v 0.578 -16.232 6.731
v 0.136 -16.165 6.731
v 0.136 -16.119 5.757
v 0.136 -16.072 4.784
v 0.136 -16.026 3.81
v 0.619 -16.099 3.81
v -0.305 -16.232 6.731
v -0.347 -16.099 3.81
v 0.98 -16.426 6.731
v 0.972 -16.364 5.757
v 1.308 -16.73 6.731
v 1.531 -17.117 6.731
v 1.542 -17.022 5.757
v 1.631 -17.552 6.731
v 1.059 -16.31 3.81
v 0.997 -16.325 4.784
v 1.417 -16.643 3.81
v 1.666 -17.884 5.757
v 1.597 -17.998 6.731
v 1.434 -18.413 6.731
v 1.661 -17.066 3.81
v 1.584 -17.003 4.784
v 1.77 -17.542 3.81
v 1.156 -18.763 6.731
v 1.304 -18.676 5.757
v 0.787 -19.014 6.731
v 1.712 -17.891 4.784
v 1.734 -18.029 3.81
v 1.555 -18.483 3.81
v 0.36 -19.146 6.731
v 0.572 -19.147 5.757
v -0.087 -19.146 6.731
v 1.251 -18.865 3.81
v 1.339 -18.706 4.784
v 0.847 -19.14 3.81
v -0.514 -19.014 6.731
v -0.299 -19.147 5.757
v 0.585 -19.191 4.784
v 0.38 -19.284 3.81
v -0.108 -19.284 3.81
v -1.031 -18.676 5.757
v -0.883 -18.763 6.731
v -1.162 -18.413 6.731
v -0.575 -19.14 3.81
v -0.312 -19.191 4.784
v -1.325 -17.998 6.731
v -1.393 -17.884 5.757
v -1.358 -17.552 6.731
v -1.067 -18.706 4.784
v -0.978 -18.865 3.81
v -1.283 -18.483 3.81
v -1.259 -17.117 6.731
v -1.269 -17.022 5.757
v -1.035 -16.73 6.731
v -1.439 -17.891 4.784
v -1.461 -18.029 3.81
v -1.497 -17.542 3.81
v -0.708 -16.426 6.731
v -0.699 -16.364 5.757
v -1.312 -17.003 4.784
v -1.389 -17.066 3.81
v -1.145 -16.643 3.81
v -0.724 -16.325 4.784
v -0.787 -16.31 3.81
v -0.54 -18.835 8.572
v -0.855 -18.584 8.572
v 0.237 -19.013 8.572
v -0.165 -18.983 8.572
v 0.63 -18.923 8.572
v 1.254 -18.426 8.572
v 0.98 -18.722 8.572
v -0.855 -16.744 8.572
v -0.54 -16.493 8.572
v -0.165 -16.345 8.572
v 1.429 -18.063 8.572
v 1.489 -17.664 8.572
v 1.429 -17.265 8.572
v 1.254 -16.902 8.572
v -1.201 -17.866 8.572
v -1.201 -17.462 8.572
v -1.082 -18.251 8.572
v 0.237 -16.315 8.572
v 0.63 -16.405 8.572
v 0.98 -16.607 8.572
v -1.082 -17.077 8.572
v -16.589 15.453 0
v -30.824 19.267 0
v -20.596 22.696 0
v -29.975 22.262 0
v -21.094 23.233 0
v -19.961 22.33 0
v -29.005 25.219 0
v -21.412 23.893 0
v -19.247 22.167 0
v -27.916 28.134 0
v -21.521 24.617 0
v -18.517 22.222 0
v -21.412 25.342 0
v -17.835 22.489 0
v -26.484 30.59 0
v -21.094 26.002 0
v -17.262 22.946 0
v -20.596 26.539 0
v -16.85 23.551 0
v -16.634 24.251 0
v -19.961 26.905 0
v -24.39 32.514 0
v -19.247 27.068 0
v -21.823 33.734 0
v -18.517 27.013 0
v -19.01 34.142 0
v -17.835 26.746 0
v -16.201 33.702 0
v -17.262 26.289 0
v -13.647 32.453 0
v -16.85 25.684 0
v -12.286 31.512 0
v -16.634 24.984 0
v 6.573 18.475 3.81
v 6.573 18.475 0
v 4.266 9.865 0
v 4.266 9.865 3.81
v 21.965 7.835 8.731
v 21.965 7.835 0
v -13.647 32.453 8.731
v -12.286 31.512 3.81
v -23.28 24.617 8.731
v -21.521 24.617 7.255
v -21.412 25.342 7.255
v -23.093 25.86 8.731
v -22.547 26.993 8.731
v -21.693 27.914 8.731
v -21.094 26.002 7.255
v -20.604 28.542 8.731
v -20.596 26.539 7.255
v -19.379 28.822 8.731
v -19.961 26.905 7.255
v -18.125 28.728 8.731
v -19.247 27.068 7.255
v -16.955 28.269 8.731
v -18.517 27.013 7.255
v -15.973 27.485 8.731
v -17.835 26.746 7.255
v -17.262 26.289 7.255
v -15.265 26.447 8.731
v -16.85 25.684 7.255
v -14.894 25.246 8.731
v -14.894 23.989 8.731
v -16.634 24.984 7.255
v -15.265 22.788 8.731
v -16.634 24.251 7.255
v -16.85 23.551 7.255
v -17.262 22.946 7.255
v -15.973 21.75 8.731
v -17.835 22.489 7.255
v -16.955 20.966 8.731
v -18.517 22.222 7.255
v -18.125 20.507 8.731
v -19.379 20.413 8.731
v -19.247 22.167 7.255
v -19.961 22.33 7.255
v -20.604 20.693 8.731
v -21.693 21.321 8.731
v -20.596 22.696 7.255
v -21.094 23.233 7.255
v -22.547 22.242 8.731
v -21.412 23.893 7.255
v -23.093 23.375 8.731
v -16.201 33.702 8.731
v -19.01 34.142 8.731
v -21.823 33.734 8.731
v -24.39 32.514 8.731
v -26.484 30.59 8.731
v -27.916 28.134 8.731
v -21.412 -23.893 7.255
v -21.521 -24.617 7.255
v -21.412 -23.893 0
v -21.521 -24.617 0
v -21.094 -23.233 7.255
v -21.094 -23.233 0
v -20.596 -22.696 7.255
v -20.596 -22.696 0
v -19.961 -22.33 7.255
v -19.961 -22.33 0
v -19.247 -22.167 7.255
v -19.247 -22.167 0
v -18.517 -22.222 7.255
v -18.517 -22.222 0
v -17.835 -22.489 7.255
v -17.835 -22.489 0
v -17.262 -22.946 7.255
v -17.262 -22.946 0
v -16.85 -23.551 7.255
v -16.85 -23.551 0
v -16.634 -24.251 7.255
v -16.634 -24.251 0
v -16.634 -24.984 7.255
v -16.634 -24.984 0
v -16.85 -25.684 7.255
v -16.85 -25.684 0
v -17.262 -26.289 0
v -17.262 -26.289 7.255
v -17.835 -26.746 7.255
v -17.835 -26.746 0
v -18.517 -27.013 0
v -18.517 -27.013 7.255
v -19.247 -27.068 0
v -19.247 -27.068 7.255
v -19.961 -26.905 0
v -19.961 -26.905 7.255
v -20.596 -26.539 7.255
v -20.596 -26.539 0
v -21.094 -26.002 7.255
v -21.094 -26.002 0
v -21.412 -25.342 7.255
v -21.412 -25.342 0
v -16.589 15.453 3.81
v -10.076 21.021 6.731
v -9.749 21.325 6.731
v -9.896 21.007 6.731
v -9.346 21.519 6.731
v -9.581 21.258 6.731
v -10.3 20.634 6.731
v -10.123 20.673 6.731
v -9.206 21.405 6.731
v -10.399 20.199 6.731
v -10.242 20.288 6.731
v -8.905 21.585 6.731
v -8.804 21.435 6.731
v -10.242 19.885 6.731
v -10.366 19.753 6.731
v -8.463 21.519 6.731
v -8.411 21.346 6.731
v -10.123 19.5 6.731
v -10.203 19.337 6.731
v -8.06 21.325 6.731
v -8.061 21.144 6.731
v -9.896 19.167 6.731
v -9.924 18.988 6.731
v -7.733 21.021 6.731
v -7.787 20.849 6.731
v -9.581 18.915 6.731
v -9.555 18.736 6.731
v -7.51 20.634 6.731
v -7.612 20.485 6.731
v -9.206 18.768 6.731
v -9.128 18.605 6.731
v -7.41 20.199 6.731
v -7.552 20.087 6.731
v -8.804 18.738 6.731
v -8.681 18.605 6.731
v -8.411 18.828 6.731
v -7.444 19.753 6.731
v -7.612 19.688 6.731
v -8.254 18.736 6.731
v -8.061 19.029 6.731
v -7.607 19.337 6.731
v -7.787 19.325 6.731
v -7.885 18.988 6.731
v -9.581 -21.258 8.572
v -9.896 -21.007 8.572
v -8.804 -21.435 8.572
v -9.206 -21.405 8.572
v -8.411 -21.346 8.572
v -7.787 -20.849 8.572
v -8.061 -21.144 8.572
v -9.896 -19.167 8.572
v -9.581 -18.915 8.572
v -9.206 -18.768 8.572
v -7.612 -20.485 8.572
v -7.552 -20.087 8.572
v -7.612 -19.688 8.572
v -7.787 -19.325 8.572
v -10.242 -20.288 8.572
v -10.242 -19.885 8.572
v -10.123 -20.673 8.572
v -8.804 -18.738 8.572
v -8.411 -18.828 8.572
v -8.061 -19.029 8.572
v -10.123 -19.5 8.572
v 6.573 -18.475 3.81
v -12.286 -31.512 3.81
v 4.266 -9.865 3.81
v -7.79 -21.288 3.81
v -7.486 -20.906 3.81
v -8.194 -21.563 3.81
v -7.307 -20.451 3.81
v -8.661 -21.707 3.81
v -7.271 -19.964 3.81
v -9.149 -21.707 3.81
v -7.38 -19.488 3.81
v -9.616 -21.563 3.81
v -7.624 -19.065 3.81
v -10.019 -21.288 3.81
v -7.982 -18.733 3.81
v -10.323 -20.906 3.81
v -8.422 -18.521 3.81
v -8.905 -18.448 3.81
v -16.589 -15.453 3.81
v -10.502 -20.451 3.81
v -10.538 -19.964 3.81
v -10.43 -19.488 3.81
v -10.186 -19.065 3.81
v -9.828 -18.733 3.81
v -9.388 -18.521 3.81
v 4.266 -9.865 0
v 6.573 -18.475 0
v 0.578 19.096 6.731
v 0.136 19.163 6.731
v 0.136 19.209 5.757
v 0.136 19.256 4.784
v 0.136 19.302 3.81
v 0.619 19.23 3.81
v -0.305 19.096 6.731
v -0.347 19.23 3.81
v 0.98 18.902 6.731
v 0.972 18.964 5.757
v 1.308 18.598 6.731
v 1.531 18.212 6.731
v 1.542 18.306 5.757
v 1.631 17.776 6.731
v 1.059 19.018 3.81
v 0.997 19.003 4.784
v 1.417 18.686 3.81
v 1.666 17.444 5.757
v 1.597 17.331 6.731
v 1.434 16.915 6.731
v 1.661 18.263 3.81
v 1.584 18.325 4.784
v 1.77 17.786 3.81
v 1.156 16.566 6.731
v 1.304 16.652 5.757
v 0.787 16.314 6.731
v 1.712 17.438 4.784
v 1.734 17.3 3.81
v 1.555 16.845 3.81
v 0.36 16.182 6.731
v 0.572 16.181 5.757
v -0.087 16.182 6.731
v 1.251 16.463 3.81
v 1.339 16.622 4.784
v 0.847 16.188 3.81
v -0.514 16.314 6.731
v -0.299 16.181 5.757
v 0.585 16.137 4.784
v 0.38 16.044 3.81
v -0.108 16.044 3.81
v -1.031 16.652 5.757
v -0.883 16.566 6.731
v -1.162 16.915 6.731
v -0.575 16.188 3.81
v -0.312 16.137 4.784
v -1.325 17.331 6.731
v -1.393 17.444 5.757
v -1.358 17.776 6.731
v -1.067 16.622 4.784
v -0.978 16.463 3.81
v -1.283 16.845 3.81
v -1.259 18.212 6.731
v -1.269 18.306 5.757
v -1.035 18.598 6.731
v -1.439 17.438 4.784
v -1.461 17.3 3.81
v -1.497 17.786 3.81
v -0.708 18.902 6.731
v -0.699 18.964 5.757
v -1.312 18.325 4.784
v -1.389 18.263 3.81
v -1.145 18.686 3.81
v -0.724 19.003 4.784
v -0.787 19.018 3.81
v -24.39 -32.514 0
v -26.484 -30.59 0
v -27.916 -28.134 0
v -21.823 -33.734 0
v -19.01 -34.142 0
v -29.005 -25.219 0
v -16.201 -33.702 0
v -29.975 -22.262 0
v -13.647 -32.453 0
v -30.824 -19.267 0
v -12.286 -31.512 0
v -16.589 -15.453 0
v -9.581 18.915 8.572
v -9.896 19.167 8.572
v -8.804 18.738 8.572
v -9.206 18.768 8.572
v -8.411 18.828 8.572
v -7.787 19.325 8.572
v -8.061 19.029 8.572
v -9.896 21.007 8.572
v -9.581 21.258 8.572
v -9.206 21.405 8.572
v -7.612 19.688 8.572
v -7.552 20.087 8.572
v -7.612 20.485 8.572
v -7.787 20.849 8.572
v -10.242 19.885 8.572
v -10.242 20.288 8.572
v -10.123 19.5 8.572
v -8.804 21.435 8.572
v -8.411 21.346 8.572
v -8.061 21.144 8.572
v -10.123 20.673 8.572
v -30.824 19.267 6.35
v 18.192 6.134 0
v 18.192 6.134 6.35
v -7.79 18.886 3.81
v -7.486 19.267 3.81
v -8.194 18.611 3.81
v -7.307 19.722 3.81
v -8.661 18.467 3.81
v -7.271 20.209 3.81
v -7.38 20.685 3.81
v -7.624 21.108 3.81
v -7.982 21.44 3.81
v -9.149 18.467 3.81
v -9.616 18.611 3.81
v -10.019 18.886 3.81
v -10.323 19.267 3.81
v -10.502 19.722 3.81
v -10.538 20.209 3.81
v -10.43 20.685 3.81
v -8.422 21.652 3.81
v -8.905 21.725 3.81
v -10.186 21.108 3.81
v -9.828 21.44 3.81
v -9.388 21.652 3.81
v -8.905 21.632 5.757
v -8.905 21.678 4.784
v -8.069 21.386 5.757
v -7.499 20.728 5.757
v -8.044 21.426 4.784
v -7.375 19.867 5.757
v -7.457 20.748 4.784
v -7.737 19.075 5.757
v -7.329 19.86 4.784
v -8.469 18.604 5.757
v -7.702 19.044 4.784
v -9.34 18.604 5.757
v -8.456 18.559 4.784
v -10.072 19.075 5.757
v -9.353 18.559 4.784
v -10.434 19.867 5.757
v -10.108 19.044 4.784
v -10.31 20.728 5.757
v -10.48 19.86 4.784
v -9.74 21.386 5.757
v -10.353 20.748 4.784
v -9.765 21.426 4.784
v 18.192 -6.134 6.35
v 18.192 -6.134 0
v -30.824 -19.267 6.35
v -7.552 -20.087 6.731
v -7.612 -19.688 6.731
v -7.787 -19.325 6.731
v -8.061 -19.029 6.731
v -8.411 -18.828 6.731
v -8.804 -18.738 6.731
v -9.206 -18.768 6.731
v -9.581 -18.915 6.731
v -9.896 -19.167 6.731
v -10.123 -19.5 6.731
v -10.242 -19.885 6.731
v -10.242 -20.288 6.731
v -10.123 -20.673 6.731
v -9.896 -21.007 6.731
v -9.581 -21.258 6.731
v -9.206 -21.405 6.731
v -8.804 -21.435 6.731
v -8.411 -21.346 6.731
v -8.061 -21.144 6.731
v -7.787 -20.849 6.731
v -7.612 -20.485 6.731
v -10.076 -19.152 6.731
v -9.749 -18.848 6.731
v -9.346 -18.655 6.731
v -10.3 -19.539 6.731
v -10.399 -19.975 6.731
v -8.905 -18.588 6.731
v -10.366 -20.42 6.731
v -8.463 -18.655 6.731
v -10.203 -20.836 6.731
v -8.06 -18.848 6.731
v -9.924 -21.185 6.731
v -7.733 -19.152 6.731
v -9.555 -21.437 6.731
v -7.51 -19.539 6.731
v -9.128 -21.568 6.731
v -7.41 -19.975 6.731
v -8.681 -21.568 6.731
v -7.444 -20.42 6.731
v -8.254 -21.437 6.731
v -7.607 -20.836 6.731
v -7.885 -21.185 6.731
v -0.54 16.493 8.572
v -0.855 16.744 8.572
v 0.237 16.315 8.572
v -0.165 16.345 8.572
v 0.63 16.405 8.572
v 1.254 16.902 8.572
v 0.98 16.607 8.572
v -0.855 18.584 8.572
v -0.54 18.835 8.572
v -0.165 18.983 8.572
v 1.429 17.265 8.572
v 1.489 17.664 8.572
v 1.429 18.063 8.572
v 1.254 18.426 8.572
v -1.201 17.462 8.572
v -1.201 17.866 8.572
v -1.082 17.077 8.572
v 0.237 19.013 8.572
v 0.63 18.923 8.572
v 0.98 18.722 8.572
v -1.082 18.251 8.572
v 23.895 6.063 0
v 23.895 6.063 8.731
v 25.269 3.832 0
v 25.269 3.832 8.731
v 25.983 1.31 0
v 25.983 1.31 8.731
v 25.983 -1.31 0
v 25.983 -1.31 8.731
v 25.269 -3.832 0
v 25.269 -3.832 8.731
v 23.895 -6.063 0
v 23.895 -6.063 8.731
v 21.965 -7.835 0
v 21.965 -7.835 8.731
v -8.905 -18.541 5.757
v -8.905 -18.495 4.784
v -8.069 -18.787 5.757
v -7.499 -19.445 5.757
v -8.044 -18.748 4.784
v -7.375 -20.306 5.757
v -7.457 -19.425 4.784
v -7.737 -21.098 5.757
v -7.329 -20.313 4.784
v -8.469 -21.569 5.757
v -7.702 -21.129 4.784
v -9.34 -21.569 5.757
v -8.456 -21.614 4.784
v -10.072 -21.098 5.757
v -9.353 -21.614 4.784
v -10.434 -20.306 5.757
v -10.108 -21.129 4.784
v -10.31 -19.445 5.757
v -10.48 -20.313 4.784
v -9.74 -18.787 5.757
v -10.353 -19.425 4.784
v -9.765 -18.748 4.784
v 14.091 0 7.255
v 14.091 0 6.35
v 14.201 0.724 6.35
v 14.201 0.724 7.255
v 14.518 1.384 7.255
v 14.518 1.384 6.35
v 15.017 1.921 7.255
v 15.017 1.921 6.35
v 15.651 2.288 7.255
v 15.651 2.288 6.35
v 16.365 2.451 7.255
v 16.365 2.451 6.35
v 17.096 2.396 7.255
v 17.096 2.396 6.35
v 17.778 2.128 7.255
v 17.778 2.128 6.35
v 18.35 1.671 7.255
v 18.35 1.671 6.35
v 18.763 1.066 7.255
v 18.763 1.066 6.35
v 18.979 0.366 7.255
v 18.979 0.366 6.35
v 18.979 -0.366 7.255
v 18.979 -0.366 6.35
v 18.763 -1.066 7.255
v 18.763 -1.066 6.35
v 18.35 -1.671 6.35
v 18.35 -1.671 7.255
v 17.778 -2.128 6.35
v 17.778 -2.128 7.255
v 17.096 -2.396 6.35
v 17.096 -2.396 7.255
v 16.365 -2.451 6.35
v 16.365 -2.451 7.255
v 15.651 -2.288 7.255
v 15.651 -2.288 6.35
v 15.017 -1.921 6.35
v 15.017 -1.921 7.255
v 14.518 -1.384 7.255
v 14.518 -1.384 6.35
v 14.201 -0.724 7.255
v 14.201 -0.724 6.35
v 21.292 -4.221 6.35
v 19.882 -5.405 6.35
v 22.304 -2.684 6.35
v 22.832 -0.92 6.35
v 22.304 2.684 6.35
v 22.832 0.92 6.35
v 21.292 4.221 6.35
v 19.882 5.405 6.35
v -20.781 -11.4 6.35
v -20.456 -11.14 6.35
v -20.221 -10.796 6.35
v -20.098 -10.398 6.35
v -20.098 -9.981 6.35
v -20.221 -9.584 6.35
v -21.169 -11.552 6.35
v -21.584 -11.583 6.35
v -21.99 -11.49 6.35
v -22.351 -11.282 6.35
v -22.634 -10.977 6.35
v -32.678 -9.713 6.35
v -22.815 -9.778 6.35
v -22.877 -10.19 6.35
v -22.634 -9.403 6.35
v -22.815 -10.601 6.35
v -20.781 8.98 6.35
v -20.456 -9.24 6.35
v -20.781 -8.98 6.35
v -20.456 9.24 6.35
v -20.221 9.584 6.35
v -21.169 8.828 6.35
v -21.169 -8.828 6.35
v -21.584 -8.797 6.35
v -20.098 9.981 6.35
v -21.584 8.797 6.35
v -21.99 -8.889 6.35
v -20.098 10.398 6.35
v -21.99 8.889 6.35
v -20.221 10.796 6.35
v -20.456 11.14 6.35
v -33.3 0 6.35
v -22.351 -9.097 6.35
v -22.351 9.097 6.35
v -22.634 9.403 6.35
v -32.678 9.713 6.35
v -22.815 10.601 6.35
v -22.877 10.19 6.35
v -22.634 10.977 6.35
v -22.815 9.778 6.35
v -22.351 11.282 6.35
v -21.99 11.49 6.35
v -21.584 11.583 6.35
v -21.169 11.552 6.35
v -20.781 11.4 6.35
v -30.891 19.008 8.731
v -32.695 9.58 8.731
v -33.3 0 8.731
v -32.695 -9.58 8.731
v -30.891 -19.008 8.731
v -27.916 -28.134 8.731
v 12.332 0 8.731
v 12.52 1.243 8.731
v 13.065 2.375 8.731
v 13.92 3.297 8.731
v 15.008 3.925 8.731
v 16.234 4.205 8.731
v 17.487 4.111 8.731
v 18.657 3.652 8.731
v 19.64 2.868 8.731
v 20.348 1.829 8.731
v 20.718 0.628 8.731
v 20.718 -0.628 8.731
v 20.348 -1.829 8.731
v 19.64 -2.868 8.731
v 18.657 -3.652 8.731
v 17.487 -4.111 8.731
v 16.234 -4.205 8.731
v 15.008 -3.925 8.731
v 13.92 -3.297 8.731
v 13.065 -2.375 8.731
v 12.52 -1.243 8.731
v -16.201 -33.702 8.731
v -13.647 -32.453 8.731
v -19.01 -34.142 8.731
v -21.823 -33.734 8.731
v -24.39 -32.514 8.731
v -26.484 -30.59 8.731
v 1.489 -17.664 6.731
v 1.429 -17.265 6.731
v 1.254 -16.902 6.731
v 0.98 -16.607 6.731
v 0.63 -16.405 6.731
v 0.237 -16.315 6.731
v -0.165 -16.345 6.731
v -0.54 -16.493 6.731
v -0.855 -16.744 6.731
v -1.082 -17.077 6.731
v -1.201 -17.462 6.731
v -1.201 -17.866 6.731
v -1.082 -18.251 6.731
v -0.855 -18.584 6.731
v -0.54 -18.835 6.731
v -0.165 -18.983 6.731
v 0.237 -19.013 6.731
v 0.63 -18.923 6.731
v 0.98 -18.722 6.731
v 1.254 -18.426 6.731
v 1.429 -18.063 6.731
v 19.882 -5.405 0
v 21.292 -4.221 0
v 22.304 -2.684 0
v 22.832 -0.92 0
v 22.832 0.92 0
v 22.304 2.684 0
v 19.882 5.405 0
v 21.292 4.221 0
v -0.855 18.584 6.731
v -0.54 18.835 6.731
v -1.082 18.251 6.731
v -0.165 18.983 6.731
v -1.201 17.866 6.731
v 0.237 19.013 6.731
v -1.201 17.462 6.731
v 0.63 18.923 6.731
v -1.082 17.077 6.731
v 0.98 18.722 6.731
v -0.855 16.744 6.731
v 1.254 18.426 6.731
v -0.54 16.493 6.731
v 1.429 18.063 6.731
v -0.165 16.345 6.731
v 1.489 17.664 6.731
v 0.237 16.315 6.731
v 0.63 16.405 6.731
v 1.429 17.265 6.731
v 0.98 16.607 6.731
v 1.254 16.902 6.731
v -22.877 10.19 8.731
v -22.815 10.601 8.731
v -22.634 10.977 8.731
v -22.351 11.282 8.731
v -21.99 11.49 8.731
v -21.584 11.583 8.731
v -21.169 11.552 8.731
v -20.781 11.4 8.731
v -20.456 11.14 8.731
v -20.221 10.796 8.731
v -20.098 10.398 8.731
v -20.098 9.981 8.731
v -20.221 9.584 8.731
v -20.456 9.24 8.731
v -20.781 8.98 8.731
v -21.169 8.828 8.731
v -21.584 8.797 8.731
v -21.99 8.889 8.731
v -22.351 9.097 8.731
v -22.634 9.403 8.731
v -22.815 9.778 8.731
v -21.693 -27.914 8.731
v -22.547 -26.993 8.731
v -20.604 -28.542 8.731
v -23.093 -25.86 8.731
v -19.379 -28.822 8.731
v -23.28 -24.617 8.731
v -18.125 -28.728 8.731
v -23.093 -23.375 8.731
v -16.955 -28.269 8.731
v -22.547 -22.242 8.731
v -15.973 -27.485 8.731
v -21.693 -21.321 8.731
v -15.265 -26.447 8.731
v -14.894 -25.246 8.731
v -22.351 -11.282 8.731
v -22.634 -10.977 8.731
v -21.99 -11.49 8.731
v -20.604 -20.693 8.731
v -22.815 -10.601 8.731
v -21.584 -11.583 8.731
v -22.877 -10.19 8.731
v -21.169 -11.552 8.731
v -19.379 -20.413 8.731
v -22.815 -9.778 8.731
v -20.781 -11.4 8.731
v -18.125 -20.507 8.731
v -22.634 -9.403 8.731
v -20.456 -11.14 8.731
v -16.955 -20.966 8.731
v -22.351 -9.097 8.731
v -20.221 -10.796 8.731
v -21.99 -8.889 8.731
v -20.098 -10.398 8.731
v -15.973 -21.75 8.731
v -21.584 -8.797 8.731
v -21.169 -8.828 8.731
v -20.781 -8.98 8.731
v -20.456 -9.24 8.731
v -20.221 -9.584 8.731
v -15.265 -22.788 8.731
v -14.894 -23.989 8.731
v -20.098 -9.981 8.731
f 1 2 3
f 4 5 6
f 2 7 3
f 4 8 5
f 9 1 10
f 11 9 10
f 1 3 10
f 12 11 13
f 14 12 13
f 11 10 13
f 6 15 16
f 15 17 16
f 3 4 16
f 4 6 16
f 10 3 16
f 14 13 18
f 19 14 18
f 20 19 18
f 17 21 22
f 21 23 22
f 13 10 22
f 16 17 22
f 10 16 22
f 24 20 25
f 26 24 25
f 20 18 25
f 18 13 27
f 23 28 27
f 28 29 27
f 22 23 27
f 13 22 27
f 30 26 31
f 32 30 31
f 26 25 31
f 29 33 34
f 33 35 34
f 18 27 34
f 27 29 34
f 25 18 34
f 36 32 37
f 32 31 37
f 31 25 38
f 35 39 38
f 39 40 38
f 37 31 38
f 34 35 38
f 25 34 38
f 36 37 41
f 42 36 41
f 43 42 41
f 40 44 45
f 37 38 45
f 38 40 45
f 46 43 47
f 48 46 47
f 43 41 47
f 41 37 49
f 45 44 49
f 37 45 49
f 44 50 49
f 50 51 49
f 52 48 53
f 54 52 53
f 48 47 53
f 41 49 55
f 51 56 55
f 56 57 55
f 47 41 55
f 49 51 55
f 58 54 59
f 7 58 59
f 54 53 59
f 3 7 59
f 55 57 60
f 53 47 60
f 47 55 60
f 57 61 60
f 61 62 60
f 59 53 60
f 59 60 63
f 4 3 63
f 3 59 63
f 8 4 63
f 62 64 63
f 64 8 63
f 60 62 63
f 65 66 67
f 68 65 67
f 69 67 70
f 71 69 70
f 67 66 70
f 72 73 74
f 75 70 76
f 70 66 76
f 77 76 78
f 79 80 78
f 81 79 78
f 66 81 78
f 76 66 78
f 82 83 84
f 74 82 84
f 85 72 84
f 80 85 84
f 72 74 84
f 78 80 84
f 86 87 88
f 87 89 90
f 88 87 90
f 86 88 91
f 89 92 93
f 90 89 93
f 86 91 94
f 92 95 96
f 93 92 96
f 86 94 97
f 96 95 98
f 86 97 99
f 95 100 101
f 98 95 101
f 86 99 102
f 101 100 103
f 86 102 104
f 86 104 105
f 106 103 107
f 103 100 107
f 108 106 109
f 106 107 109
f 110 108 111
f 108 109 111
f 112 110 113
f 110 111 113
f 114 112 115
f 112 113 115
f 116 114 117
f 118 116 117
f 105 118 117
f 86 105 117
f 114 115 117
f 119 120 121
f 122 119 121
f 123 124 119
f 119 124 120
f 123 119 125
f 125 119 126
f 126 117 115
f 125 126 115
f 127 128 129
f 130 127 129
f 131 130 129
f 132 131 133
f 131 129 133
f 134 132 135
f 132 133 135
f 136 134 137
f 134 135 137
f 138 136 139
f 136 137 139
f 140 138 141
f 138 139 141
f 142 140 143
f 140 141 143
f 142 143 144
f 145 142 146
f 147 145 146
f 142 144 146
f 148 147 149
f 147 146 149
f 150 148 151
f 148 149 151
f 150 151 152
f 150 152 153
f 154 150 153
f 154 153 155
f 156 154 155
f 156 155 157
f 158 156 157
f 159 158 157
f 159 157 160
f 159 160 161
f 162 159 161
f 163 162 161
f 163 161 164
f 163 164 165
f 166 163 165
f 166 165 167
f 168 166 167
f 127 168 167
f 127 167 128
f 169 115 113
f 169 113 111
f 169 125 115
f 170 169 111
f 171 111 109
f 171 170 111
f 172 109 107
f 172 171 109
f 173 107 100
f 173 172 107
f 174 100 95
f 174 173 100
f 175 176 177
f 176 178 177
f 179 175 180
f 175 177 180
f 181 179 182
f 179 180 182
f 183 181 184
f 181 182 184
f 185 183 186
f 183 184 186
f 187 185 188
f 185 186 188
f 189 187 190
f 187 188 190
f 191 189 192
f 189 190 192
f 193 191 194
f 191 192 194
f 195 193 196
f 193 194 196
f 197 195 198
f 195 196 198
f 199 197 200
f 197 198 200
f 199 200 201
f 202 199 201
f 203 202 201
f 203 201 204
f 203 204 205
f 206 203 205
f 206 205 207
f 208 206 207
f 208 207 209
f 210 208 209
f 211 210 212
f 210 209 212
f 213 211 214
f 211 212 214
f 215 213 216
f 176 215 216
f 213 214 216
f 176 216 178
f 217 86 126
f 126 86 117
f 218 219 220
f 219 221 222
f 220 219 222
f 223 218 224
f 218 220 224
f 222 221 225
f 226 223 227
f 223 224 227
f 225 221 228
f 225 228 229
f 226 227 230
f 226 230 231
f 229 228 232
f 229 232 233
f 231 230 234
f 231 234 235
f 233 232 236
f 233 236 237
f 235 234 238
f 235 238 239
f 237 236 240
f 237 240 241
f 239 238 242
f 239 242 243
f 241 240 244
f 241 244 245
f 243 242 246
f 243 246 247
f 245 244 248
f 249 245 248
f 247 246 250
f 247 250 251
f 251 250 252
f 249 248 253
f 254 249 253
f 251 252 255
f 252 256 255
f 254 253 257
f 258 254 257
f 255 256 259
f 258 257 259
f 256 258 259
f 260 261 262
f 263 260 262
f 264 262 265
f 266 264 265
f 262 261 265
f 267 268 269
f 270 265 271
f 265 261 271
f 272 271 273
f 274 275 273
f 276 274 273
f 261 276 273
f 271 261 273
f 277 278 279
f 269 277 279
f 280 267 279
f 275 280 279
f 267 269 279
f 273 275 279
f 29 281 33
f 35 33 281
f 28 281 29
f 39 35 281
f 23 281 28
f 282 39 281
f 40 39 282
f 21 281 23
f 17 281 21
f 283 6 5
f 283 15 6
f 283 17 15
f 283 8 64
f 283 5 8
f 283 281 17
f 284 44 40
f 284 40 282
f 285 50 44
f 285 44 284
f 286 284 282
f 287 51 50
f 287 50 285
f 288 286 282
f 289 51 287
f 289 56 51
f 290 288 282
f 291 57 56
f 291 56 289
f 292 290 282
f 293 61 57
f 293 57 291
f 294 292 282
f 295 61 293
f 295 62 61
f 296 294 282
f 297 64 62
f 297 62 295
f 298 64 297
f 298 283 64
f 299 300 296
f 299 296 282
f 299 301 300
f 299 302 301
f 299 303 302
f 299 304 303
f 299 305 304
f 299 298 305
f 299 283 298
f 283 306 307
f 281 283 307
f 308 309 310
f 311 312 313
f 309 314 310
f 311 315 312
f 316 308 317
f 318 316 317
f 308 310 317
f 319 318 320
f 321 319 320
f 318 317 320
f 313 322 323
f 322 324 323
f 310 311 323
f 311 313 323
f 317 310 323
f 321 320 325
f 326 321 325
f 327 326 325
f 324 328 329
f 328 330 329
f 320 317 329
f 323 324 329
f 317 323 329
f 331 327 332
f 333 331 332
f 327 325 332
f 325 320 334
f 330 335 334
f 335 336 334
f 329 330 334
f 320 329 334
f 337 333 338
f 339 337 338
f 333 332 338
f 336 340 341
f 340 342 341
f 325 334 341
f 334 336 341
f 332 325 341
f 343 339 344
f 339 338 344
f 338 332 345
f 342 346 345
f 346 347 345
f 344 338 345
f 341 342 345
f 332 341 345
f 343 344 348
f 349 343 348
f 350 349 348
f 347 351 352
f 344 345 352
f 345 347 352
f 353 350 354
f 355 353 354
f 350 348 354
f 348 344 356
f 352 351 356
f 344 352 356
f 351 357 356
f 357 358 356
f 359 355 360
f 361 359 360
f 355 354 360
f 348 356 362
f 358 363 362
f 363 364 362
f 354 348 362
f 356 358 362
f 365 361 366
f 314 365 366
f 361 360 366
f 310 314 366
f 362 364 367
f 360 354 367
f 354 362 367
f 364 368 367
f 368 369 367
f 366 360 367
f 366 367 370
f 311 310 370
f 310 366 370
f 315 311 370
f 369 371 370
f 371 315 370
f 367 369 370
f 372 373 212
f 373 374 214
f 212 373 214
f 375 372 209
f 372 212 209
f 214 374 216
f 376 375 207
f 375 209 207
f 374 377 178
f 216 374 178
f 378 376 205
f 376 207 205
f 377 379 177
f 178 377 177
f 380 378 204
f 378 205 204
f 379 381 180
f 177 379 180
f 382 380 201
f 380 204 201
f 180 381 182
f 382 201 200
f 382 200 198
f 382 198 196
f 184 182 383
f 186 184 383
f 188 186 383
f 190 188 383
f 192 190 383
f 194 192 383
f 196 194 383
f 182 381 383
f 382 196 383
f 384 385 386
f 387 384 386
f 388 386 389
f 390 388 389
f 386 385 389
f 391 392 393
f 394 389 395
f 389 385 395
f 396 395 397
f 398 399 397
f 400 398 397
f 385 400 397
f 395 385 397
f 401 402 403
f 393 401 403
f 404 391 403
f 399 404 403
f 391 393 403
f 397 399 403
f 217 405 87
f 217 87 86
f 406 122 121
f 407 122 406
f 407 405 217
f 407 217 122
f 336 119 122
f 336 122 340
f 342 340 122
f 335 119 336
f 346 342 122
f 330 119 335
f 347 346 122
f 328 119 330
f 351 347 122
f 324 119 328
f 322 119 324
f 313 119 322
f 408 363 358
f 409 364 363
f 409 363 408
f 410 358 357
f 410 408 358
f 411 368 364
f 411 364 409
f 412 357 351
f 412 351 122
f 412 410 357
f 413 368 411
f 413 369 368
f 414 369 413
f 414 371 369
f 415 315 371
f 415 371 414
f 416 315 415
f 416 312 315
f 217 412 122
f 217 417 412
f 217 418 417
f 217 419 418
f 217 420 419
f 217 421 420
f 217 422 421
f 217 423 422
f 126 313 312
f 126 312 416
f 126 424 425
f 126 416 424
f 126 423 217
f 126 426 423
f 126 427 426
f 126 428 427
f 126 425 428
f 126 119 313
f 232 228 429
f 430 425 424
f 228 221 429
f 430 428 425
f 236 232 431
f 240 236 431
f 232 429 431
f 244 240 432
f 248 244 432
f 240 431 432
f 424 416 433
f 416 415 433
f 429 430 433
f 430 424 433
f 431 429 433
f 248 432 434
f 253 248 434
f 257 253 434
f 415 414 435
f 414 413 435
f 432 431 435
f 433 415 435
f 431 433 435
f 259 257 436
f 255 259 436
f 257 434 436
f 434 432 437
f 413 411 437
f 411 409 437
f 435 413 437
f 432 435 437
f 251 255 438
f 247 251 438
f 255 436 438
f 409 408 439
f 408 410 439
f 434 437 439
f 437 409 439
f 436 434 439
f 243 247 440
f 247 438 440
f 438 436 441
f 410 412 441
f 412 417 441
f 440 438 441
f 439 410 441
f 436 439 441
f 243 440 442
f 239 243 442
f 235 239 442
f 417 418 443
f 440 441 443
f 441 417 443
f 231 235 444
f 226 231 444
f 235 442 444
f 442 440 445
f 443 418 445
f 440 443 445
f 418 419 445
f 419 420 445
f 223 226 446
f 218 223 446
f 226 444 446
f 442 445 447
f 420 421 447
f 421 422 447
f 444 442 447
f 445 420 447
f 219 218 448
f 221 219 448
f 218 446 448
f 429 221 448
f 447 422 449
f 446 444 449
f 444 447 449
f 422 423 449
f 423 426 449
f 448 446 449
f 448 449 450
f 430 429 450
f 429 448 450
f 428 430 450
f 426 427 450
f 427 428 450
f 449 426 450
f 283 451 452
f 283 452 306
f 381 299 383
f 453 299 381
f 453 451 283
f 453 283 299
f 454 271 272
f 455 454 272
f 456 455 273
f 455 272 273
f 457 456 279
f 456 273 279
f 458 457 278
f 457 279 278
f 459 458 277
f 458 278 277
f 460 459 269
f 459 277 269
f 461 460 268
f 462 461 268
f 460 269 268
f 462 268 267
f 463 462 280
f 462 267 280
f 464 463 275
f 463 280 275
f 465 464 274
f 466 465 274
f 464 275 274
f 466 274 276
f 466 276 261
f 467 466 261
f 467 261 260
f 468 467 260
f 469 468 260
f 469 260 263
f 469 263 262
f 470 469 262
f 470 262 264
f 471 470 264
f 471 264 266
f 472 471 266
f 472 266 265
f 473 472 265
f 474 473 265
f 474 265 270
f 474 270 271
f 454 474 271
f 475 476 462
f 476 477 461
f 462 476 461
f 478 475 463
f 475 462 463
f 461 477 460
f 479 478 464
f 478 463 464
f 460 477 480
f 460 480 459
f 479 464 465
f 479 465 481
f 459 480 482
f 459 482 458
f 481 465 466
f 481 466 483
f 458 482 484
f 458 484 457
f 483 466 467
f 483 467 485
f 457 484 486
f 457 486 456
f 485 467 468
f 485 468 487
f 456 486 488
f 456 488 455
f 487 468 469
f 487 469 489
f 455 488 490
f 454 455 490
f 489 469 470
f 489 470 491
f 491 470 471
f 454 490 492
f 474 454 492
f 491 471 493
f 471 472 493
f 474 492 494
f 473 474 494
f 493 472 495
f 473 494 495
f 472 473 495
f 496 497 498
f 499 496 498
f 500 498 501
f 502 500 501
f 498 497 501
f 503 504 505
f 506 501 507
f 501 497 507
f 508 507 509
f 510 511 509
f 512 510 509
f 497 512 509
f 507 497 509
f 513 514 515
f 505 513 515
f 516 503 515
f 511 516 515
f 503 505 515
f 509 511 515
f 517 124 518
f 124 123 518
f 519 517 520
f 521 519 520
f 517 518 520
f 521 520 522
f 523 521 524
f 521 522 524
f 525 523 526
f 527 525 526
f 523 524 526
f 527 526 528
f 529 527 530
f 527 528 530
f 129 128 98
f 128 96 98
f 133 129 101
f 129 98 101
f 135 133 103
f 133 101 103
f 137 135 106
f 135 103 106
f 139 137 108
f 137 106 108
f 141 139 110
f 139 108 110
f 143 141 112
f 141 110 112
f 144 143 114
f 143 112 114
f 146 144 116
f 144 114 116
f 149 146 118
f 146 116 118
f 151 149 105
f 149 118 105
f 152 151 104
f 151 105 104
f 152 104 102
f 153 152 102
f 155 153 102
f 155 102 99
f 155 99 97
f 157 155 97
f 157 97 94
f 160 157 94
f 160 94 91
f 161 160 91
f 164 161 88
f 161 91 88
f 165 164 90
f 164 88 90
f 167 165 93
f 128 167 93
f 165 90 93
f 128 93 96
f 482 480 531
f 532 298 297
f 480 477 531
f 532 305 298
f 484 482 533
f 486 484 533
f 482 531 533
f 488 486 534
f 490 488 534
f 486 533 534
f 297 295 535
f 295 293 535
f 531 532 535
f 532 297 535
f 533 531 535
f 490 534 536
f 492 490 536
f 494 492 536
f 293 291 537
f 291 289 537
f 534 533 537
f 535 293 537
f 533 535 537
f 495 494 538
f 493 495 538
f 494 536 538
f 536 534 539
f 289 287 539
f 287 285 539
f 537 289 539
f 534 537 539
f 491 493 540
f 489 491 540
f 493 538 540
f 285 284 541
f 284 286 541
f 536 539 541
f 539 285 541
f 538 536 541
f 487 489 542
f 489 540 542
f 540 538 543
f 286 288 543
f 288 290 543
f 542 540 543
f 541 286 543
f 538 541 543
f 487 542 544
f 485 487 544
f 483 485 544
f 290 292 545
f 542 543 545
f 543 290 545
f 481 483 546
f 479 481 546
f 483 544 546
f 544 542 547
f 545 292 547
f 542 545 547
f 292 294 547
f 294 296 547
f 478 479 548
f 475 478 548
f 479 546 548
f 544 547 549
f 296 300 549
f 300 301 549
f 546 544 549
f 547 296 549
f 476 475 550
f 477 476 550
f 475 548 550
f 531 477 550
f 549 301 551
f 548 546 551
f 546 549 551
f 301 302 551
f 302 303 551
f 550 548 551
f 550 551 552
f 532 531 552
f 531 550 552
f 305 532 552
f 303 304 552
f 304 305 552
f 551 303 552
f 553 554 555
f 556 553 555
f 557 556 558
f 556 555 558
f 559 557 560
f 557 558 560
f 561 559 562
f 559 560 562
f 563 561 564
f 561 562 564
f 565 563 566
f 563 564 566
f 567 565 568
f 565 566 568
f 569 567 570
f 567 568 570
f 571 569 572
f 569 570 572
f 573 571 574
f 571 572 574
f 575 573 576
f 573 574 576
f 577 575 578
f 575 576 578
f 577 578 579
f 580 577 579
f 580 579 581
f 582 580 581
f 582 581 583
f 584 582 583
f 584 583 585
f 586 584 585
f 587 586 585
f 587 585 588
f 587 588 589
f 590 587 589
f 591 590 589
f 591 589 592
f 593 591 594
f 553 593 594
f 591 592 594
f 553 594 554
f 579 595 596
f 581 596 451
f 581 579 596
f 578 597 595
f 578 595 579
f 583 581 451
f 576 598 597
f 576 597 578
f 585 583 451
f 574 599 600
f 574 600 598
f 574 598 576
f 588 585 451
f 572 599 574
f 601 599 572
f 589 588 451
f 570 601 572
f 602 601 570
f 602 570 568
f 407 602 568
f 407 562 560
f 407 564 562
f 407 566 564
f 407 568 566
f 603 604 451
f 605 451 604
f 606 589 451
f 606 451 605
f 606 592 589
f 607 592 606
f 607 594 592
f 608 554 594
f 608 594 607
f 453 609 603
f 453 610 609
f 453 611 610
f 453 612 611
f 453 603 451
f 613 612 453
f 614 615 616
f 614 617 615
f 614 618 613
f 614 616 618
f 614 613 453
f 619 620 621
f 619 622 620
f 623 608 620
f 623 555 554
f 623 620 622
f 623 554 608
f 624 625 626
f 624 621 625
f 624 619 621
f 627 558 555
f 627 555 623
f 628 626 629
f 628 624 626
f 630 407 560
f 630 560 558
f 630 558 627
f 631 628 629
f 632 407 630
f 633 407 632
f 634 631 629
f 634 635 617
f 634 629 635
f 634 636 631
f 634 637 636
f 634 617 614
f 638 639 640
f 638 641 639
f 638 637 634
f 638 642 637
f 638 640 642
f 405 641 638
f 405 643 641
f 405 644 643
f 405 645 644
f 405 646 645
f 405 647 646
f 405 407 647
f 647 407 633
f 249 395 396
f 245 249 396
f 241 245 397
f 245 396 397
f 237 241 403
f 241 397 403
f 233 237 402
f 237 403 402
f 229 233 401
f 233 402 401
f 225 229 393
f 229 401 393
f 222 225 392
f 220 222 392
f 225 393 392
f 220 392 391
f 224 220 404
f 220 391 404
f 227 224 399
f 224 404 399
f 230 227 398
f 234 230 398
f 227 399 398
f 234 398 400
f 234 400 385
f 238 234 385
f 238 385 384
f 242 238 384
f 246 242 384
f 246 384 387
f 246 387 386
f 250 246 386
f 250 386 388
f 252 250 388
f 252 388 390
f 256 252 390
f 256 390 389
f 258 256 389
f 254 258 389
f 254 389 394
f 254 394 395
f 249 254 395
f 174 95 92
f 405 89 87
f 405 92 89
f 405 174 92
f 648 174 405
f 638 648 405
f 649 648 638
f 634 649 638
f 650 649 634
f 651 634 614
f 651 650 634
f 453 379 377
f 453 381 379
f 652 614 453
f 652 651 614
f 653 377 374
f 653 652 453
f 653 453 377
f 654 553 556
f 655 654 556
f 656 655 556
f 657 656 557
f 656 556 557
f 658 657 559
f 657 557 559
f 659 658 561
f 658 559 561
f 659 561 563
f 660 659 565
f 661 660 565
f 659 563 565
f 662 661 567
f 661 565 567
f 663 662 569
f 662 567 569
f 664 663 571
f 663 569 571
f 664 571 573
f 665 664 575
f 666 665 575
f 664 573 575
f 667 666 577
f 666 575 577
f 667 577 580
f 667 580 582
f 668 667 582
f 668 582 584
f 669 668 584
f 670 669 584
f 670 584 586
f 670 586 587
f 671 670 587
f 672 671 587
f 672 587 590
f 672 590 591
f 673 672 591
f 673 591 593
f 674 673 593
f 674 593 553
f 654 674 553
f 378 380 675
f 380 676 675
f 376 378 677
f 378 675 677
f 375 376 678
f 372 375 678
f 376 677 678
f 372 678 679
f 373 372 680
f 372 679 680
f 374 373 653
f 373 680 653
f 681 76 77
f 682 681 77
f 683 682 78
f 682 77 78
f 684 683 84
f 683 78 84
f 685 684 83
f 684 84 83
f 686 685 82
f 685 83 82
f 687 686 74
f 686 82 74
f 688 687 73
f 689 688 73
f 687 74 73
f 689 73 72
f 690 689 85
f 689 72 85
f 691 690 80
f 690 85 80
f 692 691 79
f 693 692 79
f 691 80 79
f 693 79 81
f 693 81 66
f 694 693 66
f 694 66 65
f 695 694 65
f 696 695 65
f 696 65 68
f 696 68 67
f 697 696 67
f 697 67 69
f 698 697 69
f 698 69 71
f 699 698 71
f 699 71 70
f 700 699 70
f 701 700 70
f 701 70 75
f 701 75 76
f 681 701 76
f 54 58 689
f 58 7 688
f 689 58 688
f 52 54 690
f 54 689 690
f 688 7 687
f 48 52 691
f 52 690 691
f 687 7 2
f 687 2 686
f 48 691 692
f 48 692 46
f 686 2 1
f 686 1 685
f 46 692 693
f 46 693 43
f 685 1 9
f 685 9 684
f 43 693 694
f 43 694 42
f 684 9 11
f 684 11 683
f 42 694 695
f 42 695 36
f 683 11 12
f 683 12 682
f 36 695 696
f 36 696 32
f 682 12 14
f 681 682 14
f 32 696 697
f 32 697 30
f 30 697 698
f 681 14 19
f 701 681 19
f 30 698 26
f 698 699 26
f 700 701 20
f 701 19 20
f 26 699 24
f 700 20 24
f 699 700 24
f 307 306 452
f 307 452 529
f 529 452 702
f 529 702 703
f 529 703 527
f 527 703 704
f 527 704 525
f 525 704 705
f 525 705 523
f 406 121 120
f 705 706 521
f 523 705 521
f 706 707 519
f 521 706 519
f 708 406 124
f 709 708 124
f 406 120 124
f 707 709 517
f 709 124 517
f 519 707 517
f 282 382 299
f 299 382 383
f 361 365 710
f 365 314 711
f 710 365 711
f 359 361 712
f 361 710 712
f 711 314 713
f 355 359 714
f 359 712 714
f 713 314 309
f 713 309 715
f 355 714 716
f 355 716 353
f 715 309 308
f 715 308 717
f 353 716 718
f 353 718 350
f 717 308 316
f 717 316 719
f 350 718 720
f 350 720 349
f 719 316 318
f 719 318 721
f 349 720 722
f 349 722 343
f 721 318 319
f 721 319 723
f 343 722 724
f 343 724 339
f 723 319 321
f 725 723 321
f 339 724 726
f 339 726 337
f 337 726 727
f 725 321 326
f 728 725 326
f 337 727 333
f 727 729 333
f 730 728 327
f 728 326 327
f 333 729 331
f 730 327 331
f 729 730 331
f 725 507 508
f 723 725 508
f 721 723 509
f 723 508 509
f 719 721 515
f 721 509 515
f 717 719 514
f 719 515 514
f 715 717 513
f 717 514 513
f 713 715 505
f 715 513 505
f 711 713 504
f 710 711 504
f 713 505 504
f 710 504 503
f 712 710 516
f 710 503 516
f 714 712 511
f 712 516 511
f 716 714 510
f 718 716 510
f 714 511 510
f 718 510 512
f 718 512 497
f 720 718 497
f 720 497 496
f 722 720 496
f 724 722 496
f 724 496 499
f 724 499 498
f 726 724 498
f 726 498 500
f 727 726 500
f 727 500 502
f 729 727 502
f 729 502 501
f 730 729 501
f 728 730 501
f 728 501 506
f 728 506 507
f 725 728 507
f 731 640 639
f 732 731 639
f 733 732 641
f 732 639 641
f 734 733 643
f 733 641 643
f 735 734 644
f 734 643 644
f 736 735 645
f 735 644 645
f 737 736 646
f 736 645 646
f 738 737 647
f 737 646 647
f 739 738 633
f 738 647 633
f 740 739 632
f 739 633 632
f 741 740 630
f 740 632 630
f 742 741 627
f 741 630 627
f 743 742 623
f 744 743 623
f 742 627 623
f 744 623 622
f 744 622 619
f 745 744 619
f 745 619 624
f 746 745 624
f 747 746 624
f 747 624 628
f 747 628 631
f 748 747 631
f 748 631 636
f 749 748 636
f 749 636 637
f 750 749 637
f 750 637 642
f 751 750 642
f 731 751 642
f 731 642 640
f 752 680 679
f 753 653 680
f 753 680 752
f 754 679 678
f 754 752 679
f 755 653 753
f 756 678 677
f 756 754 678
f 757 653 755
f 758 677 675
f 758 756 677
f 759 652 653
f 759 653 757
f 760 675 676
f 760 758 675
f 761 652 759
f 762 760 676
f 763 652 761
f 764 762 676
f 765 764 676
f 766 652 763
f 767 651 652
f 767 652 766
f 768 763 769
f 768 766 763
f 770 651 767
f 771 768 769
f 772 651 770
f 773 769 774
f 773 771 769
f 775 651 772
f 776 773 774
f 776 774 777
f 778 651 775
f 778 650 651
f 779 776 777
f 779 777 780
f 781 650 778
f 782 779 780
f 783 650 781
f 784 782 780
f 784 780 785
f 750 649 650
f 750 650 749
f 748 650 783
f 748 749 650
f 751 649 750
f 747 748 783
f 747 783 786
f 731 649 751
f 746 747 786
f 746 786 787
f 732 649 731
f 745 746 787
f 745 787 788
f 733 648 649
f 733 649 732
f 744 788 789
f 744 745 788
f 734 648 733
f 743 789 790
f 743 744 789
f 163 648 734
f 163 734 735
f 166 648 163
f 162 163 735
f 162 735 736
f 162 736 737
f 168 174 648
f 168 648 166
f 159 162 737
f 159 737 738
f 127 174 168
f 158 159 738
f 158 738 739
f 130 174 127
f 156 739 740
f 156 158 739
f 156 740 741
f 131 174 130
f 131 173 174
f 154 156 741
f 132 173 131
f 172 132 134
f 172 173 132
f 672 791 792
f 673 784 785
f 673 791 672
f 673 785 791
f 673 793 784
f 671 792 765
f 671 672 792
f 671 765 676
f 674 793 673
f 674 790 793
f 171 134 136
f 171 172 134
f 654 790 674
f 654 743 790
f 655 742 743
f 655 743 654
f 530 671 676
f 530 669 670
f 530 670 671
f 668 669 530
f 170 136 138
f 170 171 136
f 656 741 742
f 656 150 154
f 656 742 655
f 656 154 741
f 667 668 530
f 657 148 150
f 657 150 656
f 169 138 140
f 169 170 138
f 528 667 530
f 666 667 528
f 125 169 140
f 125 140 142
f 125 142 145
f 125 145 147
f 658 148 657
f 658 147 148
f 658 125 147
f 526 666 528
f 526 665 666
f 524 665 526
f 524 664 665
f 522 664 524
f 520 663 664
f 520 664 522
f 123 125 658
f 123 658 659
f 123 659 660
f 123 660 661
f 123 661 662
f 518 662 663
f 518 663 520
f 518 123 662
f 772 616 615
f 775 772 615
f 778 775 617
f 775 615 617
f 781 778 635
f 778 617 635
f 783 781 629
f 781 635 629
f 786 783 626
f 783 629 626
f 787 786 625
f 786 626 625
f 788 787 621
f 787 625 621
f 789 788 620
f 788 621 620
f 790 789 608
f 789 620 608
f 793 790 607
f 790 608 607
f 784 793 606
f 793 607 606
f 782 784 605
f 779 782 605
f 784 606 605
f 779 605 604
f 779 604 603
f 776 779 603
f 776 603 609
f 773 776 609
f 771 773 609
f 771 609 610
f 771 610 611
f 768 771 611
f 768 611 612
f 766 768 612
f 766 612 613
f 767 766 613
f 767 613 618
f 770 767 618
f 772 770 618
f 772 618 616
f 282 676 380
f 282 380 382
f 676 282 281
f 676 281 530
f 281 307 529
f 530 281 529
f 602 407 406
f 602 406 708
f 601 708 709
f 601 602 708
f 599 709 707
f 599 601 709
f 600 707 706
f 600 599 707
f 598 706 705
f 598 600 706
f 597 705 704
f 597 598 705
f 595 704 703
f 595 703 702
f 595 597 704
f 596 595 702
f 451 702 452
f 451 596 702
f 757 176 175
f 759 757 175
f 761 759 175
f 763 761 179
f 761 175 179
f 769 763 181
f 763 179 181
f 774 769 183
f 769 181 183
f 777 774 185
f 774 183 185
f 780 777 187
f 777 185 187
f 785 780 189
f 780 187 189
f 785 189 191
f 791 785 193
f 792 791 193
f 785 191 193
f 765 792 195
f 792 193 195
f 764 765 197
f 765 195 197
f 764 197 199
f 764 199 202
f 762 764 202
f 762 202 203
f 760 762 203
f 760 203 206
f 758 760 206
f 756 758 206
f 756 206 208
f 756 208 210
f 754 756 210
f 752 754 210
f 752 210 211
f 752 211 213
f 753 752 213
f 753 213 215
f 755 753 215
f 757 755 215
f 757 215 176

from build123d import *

# Parameters (mm, degrees)
BOSS_EXTRUDE1_DEPTH                               = 8.73125
SKETCH2_R                                         = 101.6
SKETCH2_R_2                                       = 76.2
CUT_EXTRUDE1_DEPTH                                = 58.485257961
FILLET1_R                                         = 9.525
CSK_FOR_8_FLAT_HEAD_MACHINE_SCREW_100_D           = 4.9149
CSK_FOR_8_FLAT_HEAD_MACHINE_SCREW_100_CSINK_D     = 8.4328
CSK_FOR_8_FLAT_HEAD_MACHINE_SCREW_100_CSINK_ANGLE = 100
CUT_EXTRUDE2_START                                = -6.35
CUT_EXTRUDE2_DEPTH                                = 6.35
CUT_EXTRUDE3_DEPTH                                = 3.81
SKETCH7_R                                         = 1.397
CUT_EXTRUDE4_DEPTH                                = 3.175
HOLE1_AT_2_COUNT                                  = 2
HOLE1_AT_2_PITCH                                  = 9.3599
HOLE1_AT_3_COUNT                                  = 2
HOLE1_AT_3_PITCH                                  = 38.818175673
HOLE1_AT_4_COUNT                                  = 2
HOLE1_AT_4_PITCH                                  = 40.17317123
F_2_CLEARANCE_HOLE1_D                             = 2.7051
F_2_CLEARANCE_HOLE1_DEPTH                         = 4.7625


with BuildPart() as part:
    # Sketch1 → Boss-Extrude1 (new body)
    with BuildSketch(Plane.XY):
        Polygon((33.299680929, 0), (-33.299680929, 46.0375), (-33.299680929, -46.0375), align=None)
    extrude(amount=BOSS_EXTRUDE1_DEPTH)

    # Sketch2 → Cut-Extrude1 (cut, through all)
    with BuildSketch(Plane.XY.offset(8.73125)):
        with Locations((42.900319071, 0)):
            Circle(SKETCH2_R)
        with Locations((42.900319071, 0)):
            Circle(SKETCH2_R_2, mode=Mode.SUBTRACT)
    extrude(amount=-CUT_EXTRUDE1_DEPTH, mode=Mode.SUBTRACT)

    # Fillet1
    fillet1_edges = [part.edges().sort_by_distance(p)[0] for p in [
        (-22.72460624, -38.727369881, 4.365625),
        (-22.72460624, 38.727369881, 4.365625),
        (33.299680929, 0, 4.365625),
    ]]
    fillet(fillet1_edges, radius=FILLET1_R)

    # CSK for #8 Flat Head Machine Screw (100)1 (through all)
    with Locations(Plane.XY.offset(8.73125)):
        with Locations((-19.063658953, -24.617494846), (-19.063658953, 24.617494846), (16.54881886, 0)):
            CounterSinkHole(CSK_FOR_8_FLAT_HEAD_MACHINE_SCREW_100_D / 2, CSK_FOR_8_FLAT_HEAD_MACHINE_SCREW_100_CSINK_D / 2, counter_sink_angle=CSK_FOR_8_FLAT_HEAD_MACHINE_SCREW_100_CSINK_ANGLE)

    # Sketch5 → Cut-Extrude2 (cut)
    with BuildSketch(Plane(origin=(0, 0, 0), x_dir=(-1, 0, 0), z_dir=(0, 0, -1)).offset(CUT_EXTRUDE2_START)):
        with BuildLine():
            Line((30.823542048, 19.267389595), (-18.192319797, 6.133628997))
            ThreePointArc((-18.192319797, 6.133628997), (-22.89881886, 0), (-18.192319797, -6.133628997))
            Line((-18.192319797, -6.133628997), (30.823542048, -19.267389595))
            ThreePointArc((30.823542048, -19.267389595), (33.299680929, 0), (30.823542048, 19.267389595))
        make_face()
    extrude(amount=CUT_EXTRUDE2_DEPTH, mode=Mode.SUBTRACT)

    # Sketch6 → Cut-Extrude3 (cut)
    with BuildSketch(Plane(origin=(0, 0, 0), x_dir=(-1, 0, 0), z_dir=(0, 0, -1))):
        Polygon((16.588726313, -15.453182214), (-4.265612277, -9.86527903), (-8.867414899, -27.039440222), (11.986923691, -32.627343405), align=None)
        Polygon((11.986923691, 32.627343405), (-8.867414899, 27.039440222), (-4.265612277, 9.86527903), (16.588726313, 15.453182214), align=None)
    extrude(amount=-CUT_EXTRUDE3_DEPTH, mode=Mode.SUBTRACT)

    # Sketch7 → Cut-Extrude4 (cut)
    with BuildSketch(Plane(origin=(0, 0, 6.35), x_dir=(-1, 0, 0), z_dir=(0, 0, -1))):
        with Locations((21.479680921, -10.189705806)):
            Circle(SKETCH7_R)
        with Locations((21.479680921, 10.189705806)):
            Circle(SKETCH7_R)
    extrude(amount=-CUT_EXTRUDE4_DEPTH, mode=Mode.SUBTRACT)

    # Sketch9 → Hole1 (revolve, cut)
    with BuildSketch(Plane(origin=(-8.904685942, -20.086585615, 3.81), x_dir=(0, 1, 0), z_dir=(1, 0, 0))):
        Polygon((0, 0), (0, 2.921), (1.4986, 2.921), (1.6383, 0), align=None)
    hole1 = revolve(axis=Axis((-8.904685942, -20.086585615, 113.81), (0, 0, -1)), mode=Mode.SUBTRACT)

    # Hole1 at 2: Hole1 ×2
    with Locations(*[Vector(0.9659258262890683, 0.25881904510252096, 0) * (i * HOLE1_AT_2_PITCH) for i in range(1, HOLE1_AT_2_COUNT)]):
        add(hole1, mode=Mode.SUBTRACT)

    # Hole1 at 3: Hole1 ×2
    with Locations(*[Vector(0.23290556510295454, 0.9724993561664057, 0) * (i * HOLE1_AT_3_PITCH) for i in range(1, HOLE1_AT_3_COUNT)]):
        add(hole1, mode=Mode.SUBTRACT)

    # Hole1 at 4: Hole1 ×2
    with Locations(*[(0, i * HOLE1_AT_4_PITCH, 0) for i in range(1, HOLE1_AT_4_COUNT)]):
        add(hole1, mode=Mode.SUBTRACT)

    # #2 Clearance Hole1
    with Locations(Plane(origin=(0, 0, 3.81), x_dir=(-1, 0, 0), z_dir=(0, 0, -1))):
        with Locations((8.904685942, -20.086585615), (-0.136283199, -17.664065235), (-0.136283199, 17.664065235), (8.904685942, 20.086585615)):
            Hole(F_2_CLEARANCE_HOLE1_D / 2, depth=F_2_CLEARANCE_HOLE1_DEPTH)


solid = part.part
